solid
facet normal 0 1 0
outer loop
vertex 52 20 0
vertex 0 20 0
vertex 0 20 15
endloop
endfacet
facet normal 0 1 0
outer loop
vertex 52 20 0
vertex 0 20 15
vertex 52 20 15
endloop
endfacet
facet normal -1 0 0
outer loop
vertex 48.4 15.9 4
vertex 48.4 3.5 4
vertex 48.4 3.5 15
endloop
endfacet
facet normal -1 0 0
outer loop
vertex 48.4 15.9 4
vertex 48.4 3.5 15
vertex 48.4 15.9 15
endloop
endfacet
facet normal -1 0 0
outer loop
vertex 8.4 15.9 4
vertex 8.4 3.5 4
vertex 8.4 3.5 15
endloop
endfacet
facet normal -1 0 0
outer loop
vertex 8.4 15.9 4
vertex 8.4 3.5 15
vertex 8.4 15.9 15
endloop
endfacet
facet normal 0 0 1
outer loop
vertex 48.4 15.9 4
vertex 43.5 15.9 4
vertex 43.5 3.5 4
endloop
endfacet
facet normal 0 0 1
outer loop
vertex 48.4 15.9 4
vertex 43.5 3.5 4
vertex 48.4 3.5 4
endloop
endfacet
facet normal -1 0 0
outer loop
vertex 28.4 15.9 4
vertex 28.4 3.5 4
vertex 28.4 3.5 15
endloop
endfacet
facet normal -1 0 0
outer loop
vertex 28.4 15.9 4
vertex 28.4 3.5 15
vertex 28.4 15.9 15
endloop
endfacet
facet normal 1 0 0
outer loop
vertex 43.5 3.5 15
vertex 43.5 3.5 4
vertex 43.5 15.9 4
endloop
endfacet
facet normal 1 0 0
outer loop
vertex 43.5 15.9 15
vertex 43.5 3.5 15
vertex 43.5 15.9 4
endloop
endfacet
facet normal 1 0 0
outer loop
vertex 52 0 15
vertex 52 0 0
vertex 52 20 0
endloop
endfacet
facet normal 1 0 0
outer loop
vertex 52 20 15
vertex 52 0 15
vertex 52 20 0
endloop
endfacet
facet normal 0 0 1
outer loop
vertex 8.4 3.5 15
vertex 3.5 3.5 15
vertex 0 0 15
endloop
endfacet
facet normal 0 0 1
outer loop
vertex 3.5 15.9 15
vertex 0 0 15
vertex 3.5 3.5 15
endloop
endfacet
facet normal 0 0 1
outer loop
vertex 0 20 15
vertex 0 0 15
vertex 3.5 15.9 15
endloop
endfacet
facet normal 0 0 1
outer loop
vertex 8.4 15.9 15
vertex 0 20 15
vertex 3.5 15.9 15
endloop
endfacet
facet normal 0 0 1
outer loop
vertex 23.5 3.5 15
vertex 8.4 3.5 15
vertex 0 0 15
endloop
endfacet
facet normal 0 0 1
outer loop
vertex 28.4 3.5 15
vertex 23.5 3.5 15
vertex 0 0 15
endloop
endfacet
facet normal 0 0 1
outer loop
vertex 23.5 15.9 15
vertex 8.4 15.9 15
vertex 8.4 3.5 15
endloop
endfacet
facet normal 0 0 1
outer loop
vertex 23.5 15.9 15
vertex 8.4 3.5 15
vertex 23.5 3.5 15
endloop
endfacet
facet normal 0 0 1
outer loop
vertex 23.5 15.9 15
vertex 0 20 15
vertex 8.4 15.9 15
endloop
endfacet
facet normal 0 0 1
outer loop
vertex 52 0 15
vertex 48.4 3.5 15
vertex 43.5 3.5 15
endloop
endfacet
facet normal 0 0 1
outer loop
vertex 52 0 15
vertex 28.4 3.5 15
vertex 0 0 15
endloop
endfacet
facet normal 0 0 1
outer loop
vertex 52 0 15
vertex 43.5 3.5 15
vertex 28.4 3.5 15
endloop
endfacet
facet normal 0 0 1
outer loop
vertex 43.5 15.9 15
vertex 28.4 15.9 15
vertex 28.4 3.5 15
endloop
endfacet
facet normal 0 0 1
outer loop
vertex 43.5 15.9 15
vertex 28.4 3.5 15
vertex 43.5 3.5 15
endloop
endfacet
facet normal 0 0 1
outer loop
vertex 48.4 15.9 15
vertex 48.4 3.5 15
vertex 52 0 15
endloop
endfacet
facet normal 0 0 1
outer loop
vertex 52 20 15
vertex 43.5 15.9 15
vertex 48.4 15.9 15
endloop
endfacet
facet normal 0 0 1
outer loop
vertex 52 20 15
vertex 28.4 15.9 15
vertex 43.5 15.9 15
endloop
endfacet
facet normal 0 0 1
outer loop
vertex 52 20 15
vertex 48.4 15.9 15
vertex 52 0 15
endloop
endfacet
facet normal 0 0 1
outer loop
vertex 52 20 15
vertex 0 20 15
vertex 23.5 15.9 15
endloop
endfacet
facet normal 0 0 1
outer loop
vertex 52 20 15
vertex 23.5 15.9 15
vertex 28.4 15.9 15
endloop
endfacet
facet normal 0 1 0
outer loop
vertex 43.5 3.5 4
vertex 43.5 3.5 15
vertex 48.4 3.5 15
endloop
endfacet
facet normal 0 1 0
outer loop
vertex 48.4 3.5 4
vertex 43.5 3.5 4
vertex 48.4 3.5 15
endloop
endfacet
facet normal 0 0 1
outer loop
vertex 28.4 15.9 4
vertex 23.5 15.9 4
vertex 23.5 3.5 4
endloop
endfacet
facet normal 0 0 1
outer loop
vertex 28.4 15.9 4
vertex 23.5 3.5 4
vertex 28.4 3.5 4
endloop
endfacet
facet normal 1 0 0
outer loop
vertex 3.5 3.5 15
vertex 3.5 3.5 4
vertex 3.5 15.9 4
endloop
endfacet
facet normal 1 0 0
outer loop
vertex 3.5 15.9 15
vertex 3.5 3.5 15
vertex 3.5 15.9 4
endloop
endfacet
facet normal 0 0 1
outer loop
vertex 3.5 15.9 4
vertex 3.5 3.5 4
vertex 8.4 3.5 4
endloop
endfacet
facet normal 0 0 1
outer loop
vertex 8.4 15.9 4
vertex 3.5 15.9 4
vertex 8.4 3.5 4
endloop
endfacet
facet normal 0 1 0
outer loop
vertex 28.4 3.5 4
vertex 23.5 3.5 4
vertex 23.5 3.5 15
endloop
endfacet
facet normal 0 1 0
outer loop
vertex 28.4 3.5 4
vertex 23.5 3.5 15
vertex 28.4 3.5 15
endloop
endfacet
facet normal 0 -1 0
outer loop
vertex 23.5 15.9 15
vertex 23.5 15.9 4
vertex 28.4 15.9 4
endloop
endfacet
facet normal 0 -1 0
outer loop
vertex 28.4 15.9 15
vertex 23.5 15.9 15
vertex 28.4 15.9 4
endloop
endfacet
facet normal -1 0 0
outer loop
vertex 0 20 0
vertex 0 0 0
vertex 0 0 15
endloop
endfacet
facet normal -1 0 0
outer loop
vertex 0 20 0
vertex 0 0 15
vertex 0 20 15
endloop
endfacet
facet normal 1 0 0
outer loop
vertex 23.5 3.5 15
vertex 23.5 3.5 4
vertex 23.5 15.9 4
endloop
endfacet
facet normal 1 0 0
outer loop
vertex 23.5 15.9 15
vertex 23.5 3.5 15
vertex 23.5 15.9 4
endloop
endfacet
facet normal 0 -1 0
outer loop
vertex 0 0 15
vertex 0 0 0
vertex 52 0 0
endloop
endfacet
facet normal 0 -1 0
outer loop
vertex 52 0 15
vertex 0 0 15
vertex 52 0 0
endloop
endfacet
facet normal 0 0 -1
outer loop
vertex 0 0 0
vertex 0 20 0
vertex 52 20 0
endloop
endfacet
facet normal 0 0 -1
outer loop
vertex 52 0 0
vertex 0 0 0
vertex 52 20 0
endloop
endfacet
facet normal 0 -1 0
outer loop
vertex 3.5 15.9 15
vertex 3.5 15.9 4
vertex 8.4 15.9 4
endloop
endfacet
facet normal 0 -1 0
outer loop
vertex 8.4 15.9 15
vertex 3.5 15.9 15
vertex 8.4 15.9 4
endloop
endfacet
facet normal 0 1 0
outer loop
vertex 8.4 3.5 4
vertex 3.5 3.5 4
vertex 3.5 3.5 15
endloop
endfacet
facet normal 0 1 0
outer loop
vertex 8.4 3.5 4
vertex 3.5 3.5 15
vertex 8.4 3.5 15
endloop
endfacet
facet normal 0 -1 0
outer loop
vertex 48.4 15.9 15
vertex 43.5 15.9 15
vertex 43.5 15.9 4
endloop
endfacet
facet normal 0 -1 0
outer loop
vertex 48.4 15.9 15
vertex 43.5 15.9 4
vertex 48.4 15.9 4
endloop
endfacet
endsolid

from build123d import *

# Parameters (mm, degrees)
BOX003_W     = 4.9
BOX003_H     = 12.4
BOX003_DEPTH = 20
BOX002_W     = 4.9
BOX002_H     = 12.4
BOX002_DEPTH = 20
BOX001_W     = 4.9
BOX001_H     = 12.4
BOX001_DEPTH = 20
BOX_W        = 52
BOX_H        = 20
BOX_DEPTH    = 15


with BuildPart() as slot003:
    # Box003 → Box003 (new body)
    with BuildSketch(Plane(origin=(43.5, 3.5, 4), x_dir=(1, 0, 0), z_dir=(0, 0, 1))):
        with Locations((2.45, 6.2)):
            Rectangle(BOX003_W, BOX003_H)
    extrude(amount=BOX003_DEPTH)


with BuildPart() as slot002:
    # Box002 → Box002 (new body)
    with BuildSketch(Plane(origin=(23.5, 3.5, 4), x_dir=(1, 0, 0), z_dir=(0, 0, 1))):
        with Locations((2.45, 6.2)):
            Rectangle(BOX002_W, BOX002_H)
    extrude(amount=BOX002_DEPTH)


with BuildPart() as slots:
    # Box001 → Box001 (new body)
    with BuildSketch(Plane(origin=(3.5, 3.5, 4), x_dir=(1, 0, 0), z_dir=(0, 0, 1))):
        with Locations((2.45, 6.2)):
            Rectangle(BOX001_W, BOX001_H)
    extrude(amount=BOX001_DEPTH)

    # Fusion: union slot003, slot002
    add(slot003.part)
    add(slot002.part)


with BuildPart() as objeto_final:
    # Box → Box (new body)
    with BuildSketch(Plane.XY):
        with Locations((26, 10)):
            Rectangle(BOX_W, BOX_H)
    extrude(amount=BOX_DEPTH)

    # Cut: cut slots
    add(slots.part, mode=Mode.SUBTRACT)


solid = objeto_final.part
